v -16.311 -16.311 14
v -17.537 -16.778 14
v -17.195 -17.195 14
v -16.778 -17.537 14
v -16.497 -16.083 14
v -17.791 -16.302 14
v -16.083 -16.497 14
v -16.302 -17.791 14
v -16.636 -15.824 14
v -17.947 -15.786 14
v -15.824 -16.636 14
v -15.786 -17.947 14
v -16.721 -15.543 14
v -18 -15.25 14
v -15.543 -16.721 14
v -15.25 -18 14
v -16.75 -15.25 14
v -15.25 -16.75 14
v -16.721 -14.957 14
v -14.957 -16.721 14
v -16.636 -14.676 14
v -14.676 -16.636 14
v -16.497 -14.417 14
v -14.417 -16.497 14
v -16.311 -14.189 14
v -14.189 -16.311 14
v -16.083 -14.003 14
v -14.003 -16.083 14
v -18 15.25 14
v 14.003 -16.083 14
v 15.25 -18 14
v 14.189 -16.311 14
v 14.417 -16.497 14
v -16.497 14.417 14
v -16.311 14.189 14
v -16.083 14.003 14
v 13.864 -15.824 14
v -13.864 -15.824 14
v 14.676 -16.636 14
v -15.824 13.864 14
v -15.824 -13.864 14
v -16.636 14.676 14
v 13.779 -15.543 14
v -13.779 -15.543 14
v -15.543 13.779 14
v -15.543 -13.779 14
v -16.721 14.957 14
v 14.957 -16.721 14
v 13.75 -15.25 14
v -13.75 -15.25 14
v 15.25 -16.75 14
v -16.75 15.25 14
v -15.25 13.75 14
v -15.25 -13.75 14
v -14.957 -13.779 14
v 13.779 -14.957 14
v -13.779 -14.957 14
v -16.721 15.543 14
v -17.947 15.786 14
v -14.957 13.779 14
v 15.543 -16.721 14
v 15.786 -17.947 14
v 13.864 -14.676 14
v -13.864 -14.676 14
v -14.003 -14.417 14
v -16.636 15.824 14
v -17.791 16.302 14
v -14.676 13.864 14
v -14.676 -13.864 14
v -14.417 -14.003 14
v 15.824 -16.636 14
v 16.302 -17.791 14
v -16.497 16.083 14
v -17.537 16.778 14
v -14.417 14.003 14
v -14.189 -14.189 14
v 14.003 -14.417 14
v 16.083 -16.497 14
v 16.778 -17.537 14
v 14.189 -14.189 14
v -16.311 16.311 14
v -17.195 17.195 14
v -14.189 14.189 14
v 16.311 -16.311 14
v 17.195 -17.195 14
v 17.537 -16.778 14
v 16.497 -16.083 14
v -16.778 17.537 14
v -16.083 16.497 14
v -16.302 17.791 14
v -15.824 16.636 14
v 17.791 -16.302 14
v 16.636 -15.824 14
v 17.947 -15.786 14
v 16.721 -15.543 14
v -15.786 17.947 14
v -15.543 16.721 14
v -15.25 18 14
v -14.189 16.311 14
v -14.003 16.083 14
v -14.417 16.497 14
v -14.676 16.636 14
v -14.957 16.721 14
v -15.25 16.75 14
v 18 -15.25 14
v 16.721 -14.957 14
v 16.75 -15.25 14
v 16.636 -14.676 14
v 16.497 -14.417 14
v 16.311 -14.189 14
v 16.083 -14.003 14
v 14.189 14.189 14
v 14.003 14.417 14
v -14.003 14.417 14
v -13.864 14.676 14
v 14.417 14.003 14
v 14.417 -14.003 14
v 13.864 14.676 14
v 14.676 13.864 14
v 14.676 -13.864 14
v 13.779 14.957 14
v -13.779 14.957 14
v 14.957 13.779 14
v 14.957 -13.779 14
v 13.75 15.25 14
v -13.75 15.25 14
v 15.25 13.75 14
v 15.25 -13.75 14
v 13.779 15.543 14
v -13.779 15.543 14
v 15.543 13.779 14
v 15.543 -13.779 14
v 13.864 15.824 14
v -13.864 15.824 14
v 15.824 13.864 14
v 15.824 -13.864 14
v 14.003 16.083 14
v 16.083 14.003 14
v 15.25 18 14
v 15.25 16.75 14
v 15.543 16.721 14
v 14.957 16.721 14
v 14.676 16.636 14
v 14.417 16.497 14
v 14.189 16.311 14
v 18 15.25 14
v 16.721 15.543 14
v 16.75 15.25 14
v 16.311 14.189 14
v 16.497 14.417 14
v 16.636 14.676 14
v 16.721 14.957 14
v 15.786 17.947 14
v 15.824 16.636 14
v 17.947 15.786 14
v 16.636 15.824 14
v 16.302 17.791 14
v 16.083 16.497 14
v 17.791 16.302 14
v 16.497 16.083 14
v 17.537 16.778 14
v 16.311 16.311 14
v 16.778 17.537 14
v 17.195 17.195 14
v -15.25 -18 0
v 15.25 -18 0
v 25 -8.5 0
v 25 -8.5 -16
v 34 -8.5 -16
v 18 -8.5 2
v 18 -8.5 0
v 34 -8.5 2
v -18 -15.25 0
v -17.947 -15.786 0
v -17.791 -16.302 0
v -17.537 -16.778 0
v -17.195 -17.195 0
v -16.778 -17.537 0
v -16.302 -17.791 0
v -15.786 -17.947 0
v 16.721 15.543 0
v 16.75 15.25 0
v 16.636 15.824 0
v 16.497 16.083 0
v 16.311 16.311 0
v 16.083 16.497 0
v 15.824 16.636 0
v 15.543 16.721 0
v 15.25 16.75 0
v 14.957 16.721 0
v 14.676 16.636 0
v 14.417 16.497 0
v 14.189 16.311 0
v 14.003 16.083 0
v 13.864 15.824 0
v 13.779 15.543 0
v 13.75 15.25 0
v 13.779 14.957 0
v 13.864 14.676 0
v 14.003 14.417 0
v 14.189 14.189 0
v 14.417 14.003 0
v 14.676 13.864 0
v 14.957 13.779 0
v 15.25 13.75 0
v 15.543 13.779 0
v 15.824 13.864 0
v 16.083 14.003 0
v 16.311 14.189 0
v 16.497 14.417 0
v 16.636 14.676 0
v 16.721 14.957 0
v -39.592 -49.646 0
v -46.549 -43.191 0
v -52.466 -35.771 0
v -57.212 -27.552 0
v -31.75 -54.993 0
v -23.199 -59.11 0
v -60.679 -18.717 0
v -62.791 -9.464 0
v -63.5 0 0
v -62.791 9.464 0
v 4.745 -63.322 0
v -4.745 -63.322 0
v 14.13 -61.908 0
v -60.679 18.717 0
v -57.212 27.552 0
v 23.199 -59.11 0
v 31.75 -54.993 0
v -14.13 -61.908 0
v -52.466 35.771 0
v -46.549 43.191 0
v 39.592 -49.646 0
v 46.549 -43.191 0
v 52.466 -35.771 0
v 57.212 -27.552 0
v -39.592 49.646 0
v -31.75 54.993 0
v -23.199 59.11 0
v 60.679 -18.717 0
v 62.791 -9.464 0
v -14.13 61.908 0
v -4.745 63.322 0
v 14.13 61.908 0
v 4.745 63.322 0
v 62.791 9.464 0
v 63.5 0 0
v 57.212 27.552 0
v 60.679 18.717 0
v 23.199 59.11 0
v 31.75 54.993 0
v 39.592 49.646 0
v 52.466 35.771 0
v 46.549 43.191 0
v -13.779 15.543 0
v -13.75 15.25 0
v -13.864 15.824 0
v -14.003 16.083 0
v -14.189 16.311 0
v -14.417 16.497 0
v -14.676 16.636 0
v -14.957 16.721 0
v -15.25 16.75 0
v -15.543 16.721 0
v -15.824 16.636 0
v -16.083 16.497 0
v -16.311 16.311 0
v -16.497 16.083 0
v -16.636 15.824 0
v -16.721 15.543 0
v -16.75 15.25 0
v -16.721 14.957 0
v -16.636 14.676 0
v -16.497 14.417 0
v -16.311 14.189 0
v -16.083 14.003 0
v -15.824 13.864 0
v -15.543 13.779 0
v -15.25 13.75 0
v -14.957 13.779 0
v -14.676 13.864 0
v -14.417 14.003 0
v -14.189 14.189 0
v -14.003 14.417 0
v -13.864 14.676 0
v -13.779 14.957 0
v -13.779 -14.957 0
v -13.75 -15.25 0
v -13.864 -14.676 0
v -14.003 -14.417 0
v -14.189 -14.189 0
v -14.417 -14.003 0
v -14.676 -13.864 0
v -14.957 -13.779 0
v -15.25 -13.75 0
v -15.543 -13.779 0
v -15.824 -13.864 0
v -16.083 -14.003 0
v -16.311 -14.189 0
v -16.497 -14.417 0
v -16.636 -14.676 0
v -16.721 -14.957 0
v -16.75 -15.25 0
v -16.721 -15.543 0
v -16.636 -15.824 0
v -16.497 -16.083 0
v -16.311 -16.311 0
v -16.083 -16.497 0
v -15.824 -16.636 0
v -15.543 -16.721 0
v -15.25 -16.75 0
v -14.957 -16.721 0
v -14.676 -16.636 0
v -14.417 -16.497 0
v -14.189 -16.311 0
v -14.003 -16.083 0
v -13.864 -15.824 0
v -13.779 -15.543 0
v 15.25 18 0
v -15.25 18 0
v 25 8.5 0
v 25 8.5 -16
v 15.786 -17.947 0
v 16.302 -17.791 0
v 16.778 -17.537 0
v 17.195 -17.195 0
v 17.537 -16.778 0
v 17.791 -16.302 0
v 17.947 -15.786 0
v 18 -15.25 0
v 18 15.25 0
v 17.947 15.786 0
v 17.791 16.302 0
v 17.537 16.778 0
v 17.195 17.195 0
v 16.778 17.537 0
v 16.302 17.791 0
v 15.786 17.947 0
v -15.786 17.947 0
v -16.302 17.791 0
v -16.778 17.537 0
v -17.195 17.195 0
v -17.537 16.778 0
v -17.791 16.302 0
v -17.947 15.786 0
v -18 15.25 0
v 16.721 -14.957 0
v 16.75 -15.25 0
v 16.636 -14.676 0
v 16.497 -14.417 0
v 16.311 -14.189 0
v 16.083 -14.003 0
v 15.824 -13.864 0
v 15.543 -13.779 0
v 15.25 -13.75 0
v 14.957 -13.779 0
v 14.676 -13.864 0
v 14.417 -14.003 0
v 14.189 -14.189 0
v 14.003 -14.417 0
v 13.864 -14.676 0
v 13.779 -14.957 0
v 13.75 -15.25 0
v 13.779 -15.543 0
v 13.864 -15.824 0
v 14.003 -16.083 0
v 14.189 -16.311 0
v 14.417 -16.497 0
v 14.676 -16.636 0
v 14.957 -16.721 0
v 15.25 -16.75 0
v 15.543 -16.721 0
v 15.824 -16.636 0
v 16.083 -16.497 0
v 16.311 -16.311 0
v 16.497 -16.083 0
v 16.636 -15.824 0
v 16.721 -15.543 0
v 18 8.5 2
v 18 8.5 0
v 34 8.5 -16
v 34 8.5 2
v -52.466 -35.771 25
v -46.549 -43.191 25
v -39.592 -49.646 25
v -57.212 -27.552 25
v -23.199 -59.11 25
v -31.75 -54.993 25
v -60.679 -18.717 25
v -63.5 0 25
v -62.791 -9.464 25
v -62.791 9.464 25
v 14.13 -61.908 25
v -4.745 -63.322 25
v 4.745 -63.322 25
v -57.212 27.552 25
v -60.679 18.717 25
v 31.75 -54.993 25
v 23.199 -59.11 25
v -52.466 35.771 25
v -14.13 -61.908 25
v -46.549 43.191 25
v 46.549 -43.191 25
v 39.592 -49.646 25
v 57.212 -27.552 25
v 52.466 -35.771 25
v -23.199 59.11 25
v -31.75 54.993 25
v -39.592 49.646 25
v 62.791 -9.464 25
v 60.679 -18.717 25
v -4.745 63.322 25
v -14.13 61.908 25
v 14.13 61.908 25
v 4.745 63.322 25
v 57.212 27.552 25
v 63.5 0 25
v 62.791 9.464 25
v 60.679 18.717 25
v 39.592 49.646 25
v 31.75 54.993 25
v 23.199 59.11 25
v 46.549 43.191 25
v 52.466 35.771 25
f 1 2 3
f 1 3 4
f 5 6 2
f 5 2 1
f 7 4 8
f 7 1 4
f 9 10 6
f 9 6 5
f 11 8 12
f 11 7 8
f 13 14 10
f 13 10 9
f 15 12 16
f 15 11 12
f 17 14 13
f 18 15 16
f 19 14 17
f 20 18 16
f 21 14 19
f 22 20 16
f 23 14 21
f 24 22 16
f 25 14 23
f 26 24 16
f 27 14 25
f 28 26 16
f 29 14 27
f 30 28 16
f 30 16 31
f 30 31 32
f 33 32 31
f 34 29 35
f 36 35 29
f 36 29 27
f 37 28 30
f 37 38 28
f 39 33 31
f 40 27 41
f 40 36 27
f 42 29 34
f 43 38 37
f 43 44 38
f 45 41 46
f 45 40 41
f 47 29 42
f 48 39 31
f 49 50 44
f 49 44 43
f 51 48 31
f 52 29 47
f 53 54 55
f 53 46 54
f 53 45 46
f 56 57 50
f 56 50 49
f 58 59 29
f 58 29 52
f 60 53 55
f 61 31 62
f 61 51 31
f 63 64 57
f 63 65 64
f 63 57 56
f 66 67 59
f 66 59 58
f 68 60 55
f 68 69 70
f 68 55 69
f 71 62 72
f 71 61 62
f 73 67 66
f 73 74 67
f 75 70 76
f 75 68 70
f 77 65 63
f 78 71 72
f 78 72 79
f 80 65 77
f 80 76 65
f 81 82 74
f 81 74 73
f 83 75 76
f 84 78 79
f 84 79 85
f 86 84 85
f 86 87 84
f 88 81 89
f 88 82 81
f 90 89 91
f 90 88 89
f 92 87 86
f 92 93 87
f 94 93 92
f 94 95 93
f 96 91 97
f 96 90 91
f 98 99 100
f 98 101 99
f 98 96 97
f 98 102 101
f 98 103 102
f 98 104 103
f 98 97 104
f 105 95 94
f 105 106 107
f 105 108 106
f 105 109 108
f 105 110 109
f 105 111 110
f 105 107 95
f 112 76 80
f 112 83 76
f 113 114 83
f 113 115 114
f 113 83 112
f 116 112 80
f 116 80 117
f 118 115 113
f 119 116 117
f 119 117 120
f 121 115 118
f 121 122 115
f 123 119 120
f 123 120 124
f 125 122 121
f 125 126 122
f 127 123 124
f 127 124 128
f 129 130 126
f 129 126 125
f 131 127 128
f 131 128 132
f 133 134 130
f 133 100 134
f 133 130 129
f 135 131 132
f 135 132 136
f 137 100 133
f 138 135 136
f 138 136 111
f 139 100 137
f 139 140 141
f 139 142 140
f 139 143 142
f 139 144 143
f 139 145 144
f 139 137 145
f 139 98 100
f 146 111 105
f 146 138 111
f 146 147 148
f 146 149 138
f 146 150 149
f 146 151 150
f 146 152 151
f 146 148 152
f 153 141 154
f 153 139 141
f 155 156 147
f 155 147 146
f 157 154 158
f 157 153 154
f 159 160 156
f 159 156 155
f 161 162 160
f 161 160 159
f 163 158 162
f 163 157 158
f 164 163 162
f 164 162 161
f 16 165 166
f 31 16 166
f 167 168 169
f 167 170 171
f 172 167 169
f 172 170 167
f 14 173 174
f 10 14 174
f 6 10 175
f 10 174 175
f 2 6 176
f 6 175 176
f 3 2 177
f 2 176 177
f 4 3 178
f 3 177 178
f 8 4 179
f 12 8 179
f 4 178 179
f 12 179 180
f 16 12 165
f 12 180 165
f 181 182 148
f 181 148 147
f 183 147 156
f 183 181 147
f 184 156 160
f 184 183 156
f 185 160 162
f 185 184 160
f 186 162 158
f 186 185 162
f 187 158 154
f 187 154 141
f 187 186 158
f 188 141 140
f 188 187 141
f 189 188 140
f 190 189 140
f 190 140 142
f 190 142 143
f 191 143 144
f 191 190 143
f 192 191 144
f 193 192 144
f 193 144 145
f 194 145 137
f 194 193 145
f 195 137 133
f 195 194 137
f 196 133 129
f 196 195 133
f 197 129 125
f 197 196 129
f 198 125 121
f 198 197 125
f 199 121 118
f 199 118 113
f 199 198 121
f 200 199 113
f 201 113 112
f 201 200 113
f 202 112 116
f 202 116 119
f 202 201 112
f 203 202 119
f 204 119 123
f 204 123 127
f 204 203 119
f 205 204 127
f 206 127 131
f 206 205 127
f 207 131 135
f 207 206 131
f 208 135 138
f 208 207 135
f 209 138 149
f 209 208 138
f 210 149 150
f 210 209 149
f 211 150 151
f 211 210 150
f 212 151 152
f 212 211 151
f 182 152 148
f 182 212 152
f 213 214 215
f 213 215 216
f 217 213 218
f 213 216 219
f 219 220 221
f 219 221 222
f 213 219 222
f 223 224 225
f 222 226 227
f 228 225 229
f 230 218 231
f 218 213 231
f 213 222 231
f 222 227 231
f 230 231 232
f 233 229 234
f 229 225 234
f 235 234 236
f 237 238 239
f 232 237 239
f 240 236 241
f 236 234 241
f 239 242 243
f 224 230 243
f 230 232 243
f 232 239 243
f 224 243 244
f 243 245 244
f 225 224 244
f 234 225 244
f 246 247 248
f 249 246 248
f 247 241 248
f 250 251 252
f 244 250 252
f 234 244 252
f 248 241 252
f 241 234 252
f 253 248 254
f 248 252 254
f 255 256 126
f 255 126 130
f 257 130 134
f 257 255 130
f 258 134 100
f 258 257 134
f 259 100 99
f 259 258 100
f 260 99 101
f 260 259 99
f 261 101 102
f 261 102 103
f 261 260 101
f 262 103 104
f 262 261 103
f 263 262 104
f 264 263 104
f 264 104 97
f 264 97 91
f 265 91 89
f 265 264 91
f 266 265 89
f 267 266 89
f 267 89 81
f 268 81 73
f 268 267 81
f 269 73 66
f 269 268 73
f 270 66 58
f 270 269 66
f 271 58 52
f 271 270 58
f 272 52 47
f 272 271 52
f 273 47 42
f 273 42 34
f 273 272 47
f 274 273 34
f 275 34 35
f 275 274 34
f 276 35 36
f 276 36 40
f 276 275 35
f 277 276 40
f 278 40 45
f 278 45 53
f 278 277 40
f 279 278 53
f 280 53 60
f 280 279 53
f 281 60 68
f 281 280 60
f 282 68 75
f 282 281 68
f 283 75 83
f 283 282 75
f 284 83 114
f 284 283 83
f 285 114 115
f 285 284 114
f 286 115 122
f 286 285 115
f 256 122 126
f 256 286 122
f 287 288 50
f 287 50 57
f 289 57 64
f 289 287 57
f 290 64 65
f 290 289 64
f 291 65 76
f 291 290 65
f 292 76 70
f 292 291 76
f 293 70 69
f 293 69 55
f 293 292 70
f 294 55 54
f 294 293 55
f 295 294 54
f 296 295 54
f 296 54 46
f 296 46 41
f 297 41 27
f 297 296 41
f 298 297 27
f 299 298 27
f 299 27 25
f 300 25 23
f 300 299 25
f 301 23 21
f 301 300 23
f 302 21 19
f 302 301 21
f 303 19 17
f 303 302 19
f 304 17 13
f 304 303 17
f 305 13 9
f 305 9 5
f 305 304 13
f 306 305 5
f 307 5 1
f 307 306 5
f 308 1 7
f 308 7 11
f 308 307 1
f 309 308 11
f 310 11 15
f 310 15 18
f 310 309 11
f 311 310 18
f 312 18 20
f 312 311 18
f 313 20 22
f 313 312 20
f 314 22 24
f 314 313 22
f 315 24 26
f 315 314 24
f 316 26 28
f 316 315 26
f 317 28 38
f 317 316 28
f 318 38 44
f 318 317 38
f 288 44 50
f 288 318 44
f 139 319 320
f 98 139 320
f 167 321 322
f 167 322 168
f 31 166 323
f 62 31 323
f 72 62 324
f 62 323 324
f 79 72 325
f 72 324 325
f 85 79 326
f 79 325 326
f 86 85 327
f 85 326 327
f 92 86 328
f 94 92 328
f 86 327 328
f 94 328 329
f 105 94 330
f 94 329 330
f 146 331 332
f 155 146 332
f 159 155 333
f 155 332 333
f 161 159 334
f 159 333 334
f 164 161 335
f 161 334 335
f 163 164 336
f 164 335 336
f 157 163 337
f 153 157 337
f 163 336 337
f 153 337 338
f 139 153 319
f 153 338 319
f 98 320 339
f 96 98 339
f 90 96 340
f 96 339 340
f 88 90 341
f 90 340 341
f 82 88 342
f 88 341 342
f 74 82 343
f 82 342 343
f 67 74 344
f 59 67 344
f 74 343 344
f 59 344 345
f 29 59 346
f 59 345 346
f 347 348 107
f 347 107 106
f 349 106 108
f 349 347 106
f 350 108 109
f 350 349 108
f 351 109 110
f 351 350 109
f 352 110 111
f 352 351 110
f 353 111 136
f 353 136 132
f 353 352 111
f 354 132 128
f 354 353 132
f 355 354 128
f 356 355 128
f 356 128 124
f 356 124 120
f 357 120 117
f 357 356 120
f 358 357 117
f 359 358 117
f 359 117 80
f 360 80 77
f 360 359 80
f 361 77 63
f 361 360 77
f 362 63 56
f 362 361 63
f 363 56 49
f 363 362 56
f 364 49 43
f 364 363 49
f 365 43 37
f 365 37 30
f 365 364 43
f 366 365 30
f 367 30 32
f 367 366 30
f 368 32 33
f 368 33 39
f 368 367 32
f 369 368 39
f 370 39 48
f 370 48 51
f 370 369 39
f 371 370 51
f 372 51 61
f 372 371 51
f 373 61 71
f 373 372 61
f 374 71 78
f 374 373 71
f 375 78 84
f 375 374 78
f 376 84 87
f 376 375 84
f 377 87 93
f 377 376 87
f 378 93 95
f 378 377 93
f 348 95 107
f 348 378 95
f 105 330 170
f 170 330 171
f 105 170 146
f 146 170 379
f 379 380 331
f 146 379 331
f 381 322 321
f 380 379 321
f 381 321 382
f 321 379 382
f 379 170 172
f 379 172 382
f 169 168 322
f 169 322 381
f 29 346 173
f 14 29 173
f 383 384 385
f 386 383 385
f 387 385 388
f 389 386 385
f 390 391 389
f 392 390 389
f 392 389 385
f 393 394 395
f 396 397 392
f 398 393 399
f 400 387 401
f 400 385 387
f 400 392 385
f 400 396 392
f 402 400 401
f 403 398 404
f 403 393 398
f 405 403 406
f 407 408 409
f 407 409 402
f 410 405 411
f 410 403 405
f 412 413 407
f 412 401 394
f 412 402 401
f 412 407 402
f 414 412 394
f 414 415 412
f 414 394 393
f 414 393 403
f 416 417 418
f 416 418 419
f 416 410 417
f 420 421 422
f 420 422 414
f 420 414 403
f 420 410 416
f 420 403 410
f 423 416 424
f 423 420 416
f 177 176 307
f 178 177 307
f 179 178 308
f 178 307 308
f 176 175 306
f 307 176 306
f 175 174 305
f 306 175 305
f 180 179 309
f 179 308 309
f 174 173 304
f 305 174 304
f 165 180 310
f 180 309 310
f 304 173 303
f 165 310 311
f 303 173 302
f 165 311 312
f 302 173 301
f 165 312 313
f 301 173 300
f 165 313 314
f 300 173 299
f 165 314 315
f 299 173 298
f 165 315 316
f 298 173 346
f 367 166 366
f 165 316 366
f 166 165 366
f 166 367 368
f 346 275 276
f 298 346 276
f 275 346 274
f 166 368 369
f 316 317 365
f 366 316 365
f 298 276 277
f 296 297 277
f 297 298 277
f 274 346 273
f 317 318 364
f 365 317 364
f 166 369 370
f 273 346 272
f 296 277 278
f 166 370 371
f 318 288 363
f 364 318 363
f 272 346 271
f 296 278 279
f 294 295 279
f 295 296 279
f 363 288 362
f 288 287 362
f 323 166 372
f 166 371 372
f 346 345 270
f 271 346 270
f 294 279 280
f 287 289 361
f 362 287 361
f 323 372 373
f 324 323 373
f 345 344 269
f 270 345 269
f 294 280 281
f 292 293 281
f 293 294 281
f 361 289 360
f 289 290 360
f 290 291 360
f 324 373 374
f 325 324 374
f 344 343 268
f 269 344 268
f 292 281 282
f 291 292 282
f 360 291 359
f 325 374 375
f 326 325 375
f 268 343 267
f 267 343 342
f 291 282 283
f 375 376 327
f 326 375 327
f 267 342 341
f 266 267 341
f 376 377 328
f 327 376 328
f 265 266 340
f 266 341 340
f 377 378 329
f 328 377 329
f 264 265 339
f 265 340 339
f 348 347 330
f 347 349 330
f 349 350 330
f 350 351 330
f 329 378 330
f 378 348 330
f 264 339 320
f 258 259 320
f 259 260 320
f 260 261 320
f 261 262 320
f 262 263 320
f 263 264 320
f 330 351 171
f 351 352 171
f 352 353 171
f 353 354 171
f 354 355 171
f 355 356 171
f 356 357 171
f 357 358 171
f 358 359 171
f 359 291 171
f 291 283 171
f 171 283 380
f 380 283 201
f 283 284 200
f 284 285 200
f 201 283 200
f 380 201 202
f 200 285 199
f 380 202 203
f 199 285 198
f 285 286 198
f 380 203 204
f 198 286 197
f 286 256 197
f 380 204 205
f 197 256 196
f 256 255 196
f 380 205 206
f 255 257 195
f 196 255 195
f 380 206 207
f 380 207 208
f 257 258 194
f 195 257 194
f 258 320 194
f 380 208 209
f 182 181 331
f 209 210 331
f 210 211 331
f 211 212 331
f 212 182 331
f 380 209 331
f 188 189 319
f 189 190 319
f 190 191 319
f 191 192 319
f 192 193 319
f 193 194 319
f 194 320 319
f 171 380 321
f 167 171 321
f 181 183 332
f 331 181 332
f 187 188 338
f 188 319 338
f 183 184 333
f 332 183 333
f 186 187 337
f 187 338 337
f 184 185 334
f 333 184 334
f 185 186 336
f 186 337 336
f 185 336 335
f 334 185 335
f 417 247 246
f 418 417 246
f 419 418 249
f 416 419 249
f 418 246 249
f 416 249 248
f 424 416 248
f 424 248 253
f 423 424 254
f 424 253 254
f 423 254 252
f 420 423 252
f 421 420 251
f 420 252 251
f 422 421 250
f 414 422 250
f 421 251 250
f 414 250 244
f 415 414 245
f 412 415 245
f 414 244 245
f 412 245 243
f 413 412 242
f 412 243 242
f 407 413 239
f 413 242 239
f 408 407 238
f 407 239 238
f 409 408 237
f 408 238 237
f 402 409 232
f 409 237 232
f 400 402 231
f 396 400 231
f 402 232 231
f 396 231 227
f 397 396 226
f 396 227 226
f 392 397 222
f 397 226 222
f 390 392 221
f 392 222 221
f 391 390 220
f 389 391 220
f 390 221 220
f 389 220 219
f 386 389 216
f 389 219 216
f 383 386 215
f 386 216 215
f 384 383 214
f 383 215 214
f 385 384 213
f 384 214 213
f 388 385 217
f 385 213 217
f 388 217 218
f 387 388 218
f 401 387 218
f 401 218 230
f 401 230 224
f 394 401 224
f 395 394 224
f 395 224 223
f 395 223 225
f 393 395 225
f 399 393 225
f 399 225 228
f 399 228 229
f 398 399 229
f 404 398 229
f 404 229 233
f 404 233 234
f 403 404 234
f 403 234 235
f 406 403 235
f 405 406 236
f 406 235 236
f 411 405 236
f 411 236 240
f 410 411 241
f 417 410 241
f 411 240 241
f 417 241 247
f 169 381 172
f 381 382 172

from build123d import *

# Parameters (mm, degrees)
F0_R     = 1.5
F1_DEPTH = 14
F2_W     = 17
F2_H     = 2
F3_DEPTH = 16
F4_W     = 9
F4_H     = 17
F5_DEPTH = 16
F6_R     = 63.5
F7_DEPTH = 25


with BuildPart() as f1:
    # F0 (on Top) → F1 (new body)
    with BuildSketch(Plane.XY):
        with BuildLine():
            Line((15.25, 18), (-15.25, 18))
            ThreePointArc((-15.25, 18), (-17.194544, 17.194544), (-18, 15.25))
            Line((-18, 15.25), (-18, -15.25))
            ThreePointArc((-18, -15.25), (-17.194544, -17.194544), (-15.25, -18))
            Line((-15.25, -18), (15.25, -18))
            ThreePointArc((15.25, -18), (17.194544, -17.194544), (18, -15.25))
            Line((18, -15.25), (18, 15.25))
            ThreePointArc((18, 15.25), (17.194544, 17.194544), (15.25, 18))
        make_face()
        with Locations((-15.25, -15.25)):
            Circle(F0_R, mode=Mode.SUBTRACT)
        with Locations((15.25, -15.25)):
            Circle(F0_R, mode=Mode.SUBTRACT)
        with Locations((-15.25, 15.25)):
            Circle(F0_R, mode=Mode.SUBTRACT)
        with Locations((15.25, 15.25)):
            Circle(F0_R, mode=Mode.SUBTRACT)
    extrude(amount=F1_DEPTH)

    # F2 (on face) → F3 (join)
    with BuildSketch(Plane.YZ.offset(18)):
        with Locations((0, 1)):
            Rectangle(F2_W, F2_H)
    extrude(amount=F3_DEPTH)

    # F4 (on face) → F5 (join)
    with BuildSketch(Plane(origin=(0, 0, 0), x_dir=(1, 0, 0), z_dir=(0, 0, -1))):
        with Locations((29.5, 0)):
            Rectangle(F4_W, F4_H)
    extrude(amount=F5_DEPTH)


with BuildPart() as f7:
    # F6 (on Top) → F7 (new body)
    with BuildSketch(Plane.XY):
        Circle(F6_R)
    extrude(amount=F7_DEPTH)


solid = Compound([f1.part, f7.part])
